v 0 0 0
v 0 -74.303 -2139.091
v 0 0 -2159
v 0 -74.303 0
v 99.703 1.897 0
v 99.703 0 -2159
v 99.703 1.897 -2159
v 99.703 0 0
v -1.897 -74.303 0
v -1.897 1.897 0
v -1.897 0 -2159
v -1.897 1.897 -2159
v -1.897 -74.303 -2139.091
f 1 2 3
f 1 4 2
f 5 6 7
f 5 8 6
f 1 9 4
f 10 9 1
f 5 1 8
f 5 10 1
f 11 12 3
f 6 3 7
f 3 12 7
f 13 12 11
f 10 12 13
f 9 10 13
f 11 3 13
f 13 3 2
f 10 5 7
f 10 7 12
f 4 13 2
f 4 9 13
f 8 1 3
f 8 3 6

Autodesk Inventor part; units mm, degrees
ref_plane "YZ Plane" through (0, 0, 0) normal (1, 0, 0) x (0, 1, 0)
ref_plane "XZ Plane" through (0, 0, 0) normal (0, 1, 0) x (-1, 0, 0)
ref_plane "XY Plane" through (0, 0, 0) normal (0, 0, 1) x (1, 0, 0)
sketch "Sketch1" plane through (0, 0, 0) normal (0, 0, 1) x (1, 0, 0)
  line L0 (-1.8974, -23.3494) -> (-1.8974, -74.3026)
  line L1 (-1.8974, -74.3026) -> (0, -74.3026)
  line L2 (0, -74.3026) -> (0, 0)
  line L3 (0, 0) -> (99.7026, 0)
  line L4 (99.7026, 0) -> (99.7026, 1.8974)
  line L5 (99.7026, 1.8974) -> (-1.8974, 1.8974)
  line L6 (-1.8974, 1.8974) -> (-1.8974, -23.3494)
  dimension "d0" = 101.6
  dimension "d1" = 76.2
  dimension "d2" = 1.8974
  dimension "d3" = 1.8974
extrude "Extrusion1" add sketch "Sketch1" against normal blind 2159
sketch "Sketch2" plane through (0, -74.3026, 0) normal (1, 0, 0) x (0, 0, -1)
  line L0 (2159, 74.3026) -> (2159, 0) projected
  line L1 (2159, 74.3026) -> (2139.0907, 0)
  line L2 (0, 0) -> (2159, 0) projected
  line L3 (2139.0907, 0) -> (2159, 0)
  line L4 (2159, 0) -> (2159, 74.3026)
  point P0 (0, 74.3026)
  dimension "d9" = 15
extrude "Extrusion3" cut sketch "Sketch2" against normal up to next
properties part number "Angle--Back"
